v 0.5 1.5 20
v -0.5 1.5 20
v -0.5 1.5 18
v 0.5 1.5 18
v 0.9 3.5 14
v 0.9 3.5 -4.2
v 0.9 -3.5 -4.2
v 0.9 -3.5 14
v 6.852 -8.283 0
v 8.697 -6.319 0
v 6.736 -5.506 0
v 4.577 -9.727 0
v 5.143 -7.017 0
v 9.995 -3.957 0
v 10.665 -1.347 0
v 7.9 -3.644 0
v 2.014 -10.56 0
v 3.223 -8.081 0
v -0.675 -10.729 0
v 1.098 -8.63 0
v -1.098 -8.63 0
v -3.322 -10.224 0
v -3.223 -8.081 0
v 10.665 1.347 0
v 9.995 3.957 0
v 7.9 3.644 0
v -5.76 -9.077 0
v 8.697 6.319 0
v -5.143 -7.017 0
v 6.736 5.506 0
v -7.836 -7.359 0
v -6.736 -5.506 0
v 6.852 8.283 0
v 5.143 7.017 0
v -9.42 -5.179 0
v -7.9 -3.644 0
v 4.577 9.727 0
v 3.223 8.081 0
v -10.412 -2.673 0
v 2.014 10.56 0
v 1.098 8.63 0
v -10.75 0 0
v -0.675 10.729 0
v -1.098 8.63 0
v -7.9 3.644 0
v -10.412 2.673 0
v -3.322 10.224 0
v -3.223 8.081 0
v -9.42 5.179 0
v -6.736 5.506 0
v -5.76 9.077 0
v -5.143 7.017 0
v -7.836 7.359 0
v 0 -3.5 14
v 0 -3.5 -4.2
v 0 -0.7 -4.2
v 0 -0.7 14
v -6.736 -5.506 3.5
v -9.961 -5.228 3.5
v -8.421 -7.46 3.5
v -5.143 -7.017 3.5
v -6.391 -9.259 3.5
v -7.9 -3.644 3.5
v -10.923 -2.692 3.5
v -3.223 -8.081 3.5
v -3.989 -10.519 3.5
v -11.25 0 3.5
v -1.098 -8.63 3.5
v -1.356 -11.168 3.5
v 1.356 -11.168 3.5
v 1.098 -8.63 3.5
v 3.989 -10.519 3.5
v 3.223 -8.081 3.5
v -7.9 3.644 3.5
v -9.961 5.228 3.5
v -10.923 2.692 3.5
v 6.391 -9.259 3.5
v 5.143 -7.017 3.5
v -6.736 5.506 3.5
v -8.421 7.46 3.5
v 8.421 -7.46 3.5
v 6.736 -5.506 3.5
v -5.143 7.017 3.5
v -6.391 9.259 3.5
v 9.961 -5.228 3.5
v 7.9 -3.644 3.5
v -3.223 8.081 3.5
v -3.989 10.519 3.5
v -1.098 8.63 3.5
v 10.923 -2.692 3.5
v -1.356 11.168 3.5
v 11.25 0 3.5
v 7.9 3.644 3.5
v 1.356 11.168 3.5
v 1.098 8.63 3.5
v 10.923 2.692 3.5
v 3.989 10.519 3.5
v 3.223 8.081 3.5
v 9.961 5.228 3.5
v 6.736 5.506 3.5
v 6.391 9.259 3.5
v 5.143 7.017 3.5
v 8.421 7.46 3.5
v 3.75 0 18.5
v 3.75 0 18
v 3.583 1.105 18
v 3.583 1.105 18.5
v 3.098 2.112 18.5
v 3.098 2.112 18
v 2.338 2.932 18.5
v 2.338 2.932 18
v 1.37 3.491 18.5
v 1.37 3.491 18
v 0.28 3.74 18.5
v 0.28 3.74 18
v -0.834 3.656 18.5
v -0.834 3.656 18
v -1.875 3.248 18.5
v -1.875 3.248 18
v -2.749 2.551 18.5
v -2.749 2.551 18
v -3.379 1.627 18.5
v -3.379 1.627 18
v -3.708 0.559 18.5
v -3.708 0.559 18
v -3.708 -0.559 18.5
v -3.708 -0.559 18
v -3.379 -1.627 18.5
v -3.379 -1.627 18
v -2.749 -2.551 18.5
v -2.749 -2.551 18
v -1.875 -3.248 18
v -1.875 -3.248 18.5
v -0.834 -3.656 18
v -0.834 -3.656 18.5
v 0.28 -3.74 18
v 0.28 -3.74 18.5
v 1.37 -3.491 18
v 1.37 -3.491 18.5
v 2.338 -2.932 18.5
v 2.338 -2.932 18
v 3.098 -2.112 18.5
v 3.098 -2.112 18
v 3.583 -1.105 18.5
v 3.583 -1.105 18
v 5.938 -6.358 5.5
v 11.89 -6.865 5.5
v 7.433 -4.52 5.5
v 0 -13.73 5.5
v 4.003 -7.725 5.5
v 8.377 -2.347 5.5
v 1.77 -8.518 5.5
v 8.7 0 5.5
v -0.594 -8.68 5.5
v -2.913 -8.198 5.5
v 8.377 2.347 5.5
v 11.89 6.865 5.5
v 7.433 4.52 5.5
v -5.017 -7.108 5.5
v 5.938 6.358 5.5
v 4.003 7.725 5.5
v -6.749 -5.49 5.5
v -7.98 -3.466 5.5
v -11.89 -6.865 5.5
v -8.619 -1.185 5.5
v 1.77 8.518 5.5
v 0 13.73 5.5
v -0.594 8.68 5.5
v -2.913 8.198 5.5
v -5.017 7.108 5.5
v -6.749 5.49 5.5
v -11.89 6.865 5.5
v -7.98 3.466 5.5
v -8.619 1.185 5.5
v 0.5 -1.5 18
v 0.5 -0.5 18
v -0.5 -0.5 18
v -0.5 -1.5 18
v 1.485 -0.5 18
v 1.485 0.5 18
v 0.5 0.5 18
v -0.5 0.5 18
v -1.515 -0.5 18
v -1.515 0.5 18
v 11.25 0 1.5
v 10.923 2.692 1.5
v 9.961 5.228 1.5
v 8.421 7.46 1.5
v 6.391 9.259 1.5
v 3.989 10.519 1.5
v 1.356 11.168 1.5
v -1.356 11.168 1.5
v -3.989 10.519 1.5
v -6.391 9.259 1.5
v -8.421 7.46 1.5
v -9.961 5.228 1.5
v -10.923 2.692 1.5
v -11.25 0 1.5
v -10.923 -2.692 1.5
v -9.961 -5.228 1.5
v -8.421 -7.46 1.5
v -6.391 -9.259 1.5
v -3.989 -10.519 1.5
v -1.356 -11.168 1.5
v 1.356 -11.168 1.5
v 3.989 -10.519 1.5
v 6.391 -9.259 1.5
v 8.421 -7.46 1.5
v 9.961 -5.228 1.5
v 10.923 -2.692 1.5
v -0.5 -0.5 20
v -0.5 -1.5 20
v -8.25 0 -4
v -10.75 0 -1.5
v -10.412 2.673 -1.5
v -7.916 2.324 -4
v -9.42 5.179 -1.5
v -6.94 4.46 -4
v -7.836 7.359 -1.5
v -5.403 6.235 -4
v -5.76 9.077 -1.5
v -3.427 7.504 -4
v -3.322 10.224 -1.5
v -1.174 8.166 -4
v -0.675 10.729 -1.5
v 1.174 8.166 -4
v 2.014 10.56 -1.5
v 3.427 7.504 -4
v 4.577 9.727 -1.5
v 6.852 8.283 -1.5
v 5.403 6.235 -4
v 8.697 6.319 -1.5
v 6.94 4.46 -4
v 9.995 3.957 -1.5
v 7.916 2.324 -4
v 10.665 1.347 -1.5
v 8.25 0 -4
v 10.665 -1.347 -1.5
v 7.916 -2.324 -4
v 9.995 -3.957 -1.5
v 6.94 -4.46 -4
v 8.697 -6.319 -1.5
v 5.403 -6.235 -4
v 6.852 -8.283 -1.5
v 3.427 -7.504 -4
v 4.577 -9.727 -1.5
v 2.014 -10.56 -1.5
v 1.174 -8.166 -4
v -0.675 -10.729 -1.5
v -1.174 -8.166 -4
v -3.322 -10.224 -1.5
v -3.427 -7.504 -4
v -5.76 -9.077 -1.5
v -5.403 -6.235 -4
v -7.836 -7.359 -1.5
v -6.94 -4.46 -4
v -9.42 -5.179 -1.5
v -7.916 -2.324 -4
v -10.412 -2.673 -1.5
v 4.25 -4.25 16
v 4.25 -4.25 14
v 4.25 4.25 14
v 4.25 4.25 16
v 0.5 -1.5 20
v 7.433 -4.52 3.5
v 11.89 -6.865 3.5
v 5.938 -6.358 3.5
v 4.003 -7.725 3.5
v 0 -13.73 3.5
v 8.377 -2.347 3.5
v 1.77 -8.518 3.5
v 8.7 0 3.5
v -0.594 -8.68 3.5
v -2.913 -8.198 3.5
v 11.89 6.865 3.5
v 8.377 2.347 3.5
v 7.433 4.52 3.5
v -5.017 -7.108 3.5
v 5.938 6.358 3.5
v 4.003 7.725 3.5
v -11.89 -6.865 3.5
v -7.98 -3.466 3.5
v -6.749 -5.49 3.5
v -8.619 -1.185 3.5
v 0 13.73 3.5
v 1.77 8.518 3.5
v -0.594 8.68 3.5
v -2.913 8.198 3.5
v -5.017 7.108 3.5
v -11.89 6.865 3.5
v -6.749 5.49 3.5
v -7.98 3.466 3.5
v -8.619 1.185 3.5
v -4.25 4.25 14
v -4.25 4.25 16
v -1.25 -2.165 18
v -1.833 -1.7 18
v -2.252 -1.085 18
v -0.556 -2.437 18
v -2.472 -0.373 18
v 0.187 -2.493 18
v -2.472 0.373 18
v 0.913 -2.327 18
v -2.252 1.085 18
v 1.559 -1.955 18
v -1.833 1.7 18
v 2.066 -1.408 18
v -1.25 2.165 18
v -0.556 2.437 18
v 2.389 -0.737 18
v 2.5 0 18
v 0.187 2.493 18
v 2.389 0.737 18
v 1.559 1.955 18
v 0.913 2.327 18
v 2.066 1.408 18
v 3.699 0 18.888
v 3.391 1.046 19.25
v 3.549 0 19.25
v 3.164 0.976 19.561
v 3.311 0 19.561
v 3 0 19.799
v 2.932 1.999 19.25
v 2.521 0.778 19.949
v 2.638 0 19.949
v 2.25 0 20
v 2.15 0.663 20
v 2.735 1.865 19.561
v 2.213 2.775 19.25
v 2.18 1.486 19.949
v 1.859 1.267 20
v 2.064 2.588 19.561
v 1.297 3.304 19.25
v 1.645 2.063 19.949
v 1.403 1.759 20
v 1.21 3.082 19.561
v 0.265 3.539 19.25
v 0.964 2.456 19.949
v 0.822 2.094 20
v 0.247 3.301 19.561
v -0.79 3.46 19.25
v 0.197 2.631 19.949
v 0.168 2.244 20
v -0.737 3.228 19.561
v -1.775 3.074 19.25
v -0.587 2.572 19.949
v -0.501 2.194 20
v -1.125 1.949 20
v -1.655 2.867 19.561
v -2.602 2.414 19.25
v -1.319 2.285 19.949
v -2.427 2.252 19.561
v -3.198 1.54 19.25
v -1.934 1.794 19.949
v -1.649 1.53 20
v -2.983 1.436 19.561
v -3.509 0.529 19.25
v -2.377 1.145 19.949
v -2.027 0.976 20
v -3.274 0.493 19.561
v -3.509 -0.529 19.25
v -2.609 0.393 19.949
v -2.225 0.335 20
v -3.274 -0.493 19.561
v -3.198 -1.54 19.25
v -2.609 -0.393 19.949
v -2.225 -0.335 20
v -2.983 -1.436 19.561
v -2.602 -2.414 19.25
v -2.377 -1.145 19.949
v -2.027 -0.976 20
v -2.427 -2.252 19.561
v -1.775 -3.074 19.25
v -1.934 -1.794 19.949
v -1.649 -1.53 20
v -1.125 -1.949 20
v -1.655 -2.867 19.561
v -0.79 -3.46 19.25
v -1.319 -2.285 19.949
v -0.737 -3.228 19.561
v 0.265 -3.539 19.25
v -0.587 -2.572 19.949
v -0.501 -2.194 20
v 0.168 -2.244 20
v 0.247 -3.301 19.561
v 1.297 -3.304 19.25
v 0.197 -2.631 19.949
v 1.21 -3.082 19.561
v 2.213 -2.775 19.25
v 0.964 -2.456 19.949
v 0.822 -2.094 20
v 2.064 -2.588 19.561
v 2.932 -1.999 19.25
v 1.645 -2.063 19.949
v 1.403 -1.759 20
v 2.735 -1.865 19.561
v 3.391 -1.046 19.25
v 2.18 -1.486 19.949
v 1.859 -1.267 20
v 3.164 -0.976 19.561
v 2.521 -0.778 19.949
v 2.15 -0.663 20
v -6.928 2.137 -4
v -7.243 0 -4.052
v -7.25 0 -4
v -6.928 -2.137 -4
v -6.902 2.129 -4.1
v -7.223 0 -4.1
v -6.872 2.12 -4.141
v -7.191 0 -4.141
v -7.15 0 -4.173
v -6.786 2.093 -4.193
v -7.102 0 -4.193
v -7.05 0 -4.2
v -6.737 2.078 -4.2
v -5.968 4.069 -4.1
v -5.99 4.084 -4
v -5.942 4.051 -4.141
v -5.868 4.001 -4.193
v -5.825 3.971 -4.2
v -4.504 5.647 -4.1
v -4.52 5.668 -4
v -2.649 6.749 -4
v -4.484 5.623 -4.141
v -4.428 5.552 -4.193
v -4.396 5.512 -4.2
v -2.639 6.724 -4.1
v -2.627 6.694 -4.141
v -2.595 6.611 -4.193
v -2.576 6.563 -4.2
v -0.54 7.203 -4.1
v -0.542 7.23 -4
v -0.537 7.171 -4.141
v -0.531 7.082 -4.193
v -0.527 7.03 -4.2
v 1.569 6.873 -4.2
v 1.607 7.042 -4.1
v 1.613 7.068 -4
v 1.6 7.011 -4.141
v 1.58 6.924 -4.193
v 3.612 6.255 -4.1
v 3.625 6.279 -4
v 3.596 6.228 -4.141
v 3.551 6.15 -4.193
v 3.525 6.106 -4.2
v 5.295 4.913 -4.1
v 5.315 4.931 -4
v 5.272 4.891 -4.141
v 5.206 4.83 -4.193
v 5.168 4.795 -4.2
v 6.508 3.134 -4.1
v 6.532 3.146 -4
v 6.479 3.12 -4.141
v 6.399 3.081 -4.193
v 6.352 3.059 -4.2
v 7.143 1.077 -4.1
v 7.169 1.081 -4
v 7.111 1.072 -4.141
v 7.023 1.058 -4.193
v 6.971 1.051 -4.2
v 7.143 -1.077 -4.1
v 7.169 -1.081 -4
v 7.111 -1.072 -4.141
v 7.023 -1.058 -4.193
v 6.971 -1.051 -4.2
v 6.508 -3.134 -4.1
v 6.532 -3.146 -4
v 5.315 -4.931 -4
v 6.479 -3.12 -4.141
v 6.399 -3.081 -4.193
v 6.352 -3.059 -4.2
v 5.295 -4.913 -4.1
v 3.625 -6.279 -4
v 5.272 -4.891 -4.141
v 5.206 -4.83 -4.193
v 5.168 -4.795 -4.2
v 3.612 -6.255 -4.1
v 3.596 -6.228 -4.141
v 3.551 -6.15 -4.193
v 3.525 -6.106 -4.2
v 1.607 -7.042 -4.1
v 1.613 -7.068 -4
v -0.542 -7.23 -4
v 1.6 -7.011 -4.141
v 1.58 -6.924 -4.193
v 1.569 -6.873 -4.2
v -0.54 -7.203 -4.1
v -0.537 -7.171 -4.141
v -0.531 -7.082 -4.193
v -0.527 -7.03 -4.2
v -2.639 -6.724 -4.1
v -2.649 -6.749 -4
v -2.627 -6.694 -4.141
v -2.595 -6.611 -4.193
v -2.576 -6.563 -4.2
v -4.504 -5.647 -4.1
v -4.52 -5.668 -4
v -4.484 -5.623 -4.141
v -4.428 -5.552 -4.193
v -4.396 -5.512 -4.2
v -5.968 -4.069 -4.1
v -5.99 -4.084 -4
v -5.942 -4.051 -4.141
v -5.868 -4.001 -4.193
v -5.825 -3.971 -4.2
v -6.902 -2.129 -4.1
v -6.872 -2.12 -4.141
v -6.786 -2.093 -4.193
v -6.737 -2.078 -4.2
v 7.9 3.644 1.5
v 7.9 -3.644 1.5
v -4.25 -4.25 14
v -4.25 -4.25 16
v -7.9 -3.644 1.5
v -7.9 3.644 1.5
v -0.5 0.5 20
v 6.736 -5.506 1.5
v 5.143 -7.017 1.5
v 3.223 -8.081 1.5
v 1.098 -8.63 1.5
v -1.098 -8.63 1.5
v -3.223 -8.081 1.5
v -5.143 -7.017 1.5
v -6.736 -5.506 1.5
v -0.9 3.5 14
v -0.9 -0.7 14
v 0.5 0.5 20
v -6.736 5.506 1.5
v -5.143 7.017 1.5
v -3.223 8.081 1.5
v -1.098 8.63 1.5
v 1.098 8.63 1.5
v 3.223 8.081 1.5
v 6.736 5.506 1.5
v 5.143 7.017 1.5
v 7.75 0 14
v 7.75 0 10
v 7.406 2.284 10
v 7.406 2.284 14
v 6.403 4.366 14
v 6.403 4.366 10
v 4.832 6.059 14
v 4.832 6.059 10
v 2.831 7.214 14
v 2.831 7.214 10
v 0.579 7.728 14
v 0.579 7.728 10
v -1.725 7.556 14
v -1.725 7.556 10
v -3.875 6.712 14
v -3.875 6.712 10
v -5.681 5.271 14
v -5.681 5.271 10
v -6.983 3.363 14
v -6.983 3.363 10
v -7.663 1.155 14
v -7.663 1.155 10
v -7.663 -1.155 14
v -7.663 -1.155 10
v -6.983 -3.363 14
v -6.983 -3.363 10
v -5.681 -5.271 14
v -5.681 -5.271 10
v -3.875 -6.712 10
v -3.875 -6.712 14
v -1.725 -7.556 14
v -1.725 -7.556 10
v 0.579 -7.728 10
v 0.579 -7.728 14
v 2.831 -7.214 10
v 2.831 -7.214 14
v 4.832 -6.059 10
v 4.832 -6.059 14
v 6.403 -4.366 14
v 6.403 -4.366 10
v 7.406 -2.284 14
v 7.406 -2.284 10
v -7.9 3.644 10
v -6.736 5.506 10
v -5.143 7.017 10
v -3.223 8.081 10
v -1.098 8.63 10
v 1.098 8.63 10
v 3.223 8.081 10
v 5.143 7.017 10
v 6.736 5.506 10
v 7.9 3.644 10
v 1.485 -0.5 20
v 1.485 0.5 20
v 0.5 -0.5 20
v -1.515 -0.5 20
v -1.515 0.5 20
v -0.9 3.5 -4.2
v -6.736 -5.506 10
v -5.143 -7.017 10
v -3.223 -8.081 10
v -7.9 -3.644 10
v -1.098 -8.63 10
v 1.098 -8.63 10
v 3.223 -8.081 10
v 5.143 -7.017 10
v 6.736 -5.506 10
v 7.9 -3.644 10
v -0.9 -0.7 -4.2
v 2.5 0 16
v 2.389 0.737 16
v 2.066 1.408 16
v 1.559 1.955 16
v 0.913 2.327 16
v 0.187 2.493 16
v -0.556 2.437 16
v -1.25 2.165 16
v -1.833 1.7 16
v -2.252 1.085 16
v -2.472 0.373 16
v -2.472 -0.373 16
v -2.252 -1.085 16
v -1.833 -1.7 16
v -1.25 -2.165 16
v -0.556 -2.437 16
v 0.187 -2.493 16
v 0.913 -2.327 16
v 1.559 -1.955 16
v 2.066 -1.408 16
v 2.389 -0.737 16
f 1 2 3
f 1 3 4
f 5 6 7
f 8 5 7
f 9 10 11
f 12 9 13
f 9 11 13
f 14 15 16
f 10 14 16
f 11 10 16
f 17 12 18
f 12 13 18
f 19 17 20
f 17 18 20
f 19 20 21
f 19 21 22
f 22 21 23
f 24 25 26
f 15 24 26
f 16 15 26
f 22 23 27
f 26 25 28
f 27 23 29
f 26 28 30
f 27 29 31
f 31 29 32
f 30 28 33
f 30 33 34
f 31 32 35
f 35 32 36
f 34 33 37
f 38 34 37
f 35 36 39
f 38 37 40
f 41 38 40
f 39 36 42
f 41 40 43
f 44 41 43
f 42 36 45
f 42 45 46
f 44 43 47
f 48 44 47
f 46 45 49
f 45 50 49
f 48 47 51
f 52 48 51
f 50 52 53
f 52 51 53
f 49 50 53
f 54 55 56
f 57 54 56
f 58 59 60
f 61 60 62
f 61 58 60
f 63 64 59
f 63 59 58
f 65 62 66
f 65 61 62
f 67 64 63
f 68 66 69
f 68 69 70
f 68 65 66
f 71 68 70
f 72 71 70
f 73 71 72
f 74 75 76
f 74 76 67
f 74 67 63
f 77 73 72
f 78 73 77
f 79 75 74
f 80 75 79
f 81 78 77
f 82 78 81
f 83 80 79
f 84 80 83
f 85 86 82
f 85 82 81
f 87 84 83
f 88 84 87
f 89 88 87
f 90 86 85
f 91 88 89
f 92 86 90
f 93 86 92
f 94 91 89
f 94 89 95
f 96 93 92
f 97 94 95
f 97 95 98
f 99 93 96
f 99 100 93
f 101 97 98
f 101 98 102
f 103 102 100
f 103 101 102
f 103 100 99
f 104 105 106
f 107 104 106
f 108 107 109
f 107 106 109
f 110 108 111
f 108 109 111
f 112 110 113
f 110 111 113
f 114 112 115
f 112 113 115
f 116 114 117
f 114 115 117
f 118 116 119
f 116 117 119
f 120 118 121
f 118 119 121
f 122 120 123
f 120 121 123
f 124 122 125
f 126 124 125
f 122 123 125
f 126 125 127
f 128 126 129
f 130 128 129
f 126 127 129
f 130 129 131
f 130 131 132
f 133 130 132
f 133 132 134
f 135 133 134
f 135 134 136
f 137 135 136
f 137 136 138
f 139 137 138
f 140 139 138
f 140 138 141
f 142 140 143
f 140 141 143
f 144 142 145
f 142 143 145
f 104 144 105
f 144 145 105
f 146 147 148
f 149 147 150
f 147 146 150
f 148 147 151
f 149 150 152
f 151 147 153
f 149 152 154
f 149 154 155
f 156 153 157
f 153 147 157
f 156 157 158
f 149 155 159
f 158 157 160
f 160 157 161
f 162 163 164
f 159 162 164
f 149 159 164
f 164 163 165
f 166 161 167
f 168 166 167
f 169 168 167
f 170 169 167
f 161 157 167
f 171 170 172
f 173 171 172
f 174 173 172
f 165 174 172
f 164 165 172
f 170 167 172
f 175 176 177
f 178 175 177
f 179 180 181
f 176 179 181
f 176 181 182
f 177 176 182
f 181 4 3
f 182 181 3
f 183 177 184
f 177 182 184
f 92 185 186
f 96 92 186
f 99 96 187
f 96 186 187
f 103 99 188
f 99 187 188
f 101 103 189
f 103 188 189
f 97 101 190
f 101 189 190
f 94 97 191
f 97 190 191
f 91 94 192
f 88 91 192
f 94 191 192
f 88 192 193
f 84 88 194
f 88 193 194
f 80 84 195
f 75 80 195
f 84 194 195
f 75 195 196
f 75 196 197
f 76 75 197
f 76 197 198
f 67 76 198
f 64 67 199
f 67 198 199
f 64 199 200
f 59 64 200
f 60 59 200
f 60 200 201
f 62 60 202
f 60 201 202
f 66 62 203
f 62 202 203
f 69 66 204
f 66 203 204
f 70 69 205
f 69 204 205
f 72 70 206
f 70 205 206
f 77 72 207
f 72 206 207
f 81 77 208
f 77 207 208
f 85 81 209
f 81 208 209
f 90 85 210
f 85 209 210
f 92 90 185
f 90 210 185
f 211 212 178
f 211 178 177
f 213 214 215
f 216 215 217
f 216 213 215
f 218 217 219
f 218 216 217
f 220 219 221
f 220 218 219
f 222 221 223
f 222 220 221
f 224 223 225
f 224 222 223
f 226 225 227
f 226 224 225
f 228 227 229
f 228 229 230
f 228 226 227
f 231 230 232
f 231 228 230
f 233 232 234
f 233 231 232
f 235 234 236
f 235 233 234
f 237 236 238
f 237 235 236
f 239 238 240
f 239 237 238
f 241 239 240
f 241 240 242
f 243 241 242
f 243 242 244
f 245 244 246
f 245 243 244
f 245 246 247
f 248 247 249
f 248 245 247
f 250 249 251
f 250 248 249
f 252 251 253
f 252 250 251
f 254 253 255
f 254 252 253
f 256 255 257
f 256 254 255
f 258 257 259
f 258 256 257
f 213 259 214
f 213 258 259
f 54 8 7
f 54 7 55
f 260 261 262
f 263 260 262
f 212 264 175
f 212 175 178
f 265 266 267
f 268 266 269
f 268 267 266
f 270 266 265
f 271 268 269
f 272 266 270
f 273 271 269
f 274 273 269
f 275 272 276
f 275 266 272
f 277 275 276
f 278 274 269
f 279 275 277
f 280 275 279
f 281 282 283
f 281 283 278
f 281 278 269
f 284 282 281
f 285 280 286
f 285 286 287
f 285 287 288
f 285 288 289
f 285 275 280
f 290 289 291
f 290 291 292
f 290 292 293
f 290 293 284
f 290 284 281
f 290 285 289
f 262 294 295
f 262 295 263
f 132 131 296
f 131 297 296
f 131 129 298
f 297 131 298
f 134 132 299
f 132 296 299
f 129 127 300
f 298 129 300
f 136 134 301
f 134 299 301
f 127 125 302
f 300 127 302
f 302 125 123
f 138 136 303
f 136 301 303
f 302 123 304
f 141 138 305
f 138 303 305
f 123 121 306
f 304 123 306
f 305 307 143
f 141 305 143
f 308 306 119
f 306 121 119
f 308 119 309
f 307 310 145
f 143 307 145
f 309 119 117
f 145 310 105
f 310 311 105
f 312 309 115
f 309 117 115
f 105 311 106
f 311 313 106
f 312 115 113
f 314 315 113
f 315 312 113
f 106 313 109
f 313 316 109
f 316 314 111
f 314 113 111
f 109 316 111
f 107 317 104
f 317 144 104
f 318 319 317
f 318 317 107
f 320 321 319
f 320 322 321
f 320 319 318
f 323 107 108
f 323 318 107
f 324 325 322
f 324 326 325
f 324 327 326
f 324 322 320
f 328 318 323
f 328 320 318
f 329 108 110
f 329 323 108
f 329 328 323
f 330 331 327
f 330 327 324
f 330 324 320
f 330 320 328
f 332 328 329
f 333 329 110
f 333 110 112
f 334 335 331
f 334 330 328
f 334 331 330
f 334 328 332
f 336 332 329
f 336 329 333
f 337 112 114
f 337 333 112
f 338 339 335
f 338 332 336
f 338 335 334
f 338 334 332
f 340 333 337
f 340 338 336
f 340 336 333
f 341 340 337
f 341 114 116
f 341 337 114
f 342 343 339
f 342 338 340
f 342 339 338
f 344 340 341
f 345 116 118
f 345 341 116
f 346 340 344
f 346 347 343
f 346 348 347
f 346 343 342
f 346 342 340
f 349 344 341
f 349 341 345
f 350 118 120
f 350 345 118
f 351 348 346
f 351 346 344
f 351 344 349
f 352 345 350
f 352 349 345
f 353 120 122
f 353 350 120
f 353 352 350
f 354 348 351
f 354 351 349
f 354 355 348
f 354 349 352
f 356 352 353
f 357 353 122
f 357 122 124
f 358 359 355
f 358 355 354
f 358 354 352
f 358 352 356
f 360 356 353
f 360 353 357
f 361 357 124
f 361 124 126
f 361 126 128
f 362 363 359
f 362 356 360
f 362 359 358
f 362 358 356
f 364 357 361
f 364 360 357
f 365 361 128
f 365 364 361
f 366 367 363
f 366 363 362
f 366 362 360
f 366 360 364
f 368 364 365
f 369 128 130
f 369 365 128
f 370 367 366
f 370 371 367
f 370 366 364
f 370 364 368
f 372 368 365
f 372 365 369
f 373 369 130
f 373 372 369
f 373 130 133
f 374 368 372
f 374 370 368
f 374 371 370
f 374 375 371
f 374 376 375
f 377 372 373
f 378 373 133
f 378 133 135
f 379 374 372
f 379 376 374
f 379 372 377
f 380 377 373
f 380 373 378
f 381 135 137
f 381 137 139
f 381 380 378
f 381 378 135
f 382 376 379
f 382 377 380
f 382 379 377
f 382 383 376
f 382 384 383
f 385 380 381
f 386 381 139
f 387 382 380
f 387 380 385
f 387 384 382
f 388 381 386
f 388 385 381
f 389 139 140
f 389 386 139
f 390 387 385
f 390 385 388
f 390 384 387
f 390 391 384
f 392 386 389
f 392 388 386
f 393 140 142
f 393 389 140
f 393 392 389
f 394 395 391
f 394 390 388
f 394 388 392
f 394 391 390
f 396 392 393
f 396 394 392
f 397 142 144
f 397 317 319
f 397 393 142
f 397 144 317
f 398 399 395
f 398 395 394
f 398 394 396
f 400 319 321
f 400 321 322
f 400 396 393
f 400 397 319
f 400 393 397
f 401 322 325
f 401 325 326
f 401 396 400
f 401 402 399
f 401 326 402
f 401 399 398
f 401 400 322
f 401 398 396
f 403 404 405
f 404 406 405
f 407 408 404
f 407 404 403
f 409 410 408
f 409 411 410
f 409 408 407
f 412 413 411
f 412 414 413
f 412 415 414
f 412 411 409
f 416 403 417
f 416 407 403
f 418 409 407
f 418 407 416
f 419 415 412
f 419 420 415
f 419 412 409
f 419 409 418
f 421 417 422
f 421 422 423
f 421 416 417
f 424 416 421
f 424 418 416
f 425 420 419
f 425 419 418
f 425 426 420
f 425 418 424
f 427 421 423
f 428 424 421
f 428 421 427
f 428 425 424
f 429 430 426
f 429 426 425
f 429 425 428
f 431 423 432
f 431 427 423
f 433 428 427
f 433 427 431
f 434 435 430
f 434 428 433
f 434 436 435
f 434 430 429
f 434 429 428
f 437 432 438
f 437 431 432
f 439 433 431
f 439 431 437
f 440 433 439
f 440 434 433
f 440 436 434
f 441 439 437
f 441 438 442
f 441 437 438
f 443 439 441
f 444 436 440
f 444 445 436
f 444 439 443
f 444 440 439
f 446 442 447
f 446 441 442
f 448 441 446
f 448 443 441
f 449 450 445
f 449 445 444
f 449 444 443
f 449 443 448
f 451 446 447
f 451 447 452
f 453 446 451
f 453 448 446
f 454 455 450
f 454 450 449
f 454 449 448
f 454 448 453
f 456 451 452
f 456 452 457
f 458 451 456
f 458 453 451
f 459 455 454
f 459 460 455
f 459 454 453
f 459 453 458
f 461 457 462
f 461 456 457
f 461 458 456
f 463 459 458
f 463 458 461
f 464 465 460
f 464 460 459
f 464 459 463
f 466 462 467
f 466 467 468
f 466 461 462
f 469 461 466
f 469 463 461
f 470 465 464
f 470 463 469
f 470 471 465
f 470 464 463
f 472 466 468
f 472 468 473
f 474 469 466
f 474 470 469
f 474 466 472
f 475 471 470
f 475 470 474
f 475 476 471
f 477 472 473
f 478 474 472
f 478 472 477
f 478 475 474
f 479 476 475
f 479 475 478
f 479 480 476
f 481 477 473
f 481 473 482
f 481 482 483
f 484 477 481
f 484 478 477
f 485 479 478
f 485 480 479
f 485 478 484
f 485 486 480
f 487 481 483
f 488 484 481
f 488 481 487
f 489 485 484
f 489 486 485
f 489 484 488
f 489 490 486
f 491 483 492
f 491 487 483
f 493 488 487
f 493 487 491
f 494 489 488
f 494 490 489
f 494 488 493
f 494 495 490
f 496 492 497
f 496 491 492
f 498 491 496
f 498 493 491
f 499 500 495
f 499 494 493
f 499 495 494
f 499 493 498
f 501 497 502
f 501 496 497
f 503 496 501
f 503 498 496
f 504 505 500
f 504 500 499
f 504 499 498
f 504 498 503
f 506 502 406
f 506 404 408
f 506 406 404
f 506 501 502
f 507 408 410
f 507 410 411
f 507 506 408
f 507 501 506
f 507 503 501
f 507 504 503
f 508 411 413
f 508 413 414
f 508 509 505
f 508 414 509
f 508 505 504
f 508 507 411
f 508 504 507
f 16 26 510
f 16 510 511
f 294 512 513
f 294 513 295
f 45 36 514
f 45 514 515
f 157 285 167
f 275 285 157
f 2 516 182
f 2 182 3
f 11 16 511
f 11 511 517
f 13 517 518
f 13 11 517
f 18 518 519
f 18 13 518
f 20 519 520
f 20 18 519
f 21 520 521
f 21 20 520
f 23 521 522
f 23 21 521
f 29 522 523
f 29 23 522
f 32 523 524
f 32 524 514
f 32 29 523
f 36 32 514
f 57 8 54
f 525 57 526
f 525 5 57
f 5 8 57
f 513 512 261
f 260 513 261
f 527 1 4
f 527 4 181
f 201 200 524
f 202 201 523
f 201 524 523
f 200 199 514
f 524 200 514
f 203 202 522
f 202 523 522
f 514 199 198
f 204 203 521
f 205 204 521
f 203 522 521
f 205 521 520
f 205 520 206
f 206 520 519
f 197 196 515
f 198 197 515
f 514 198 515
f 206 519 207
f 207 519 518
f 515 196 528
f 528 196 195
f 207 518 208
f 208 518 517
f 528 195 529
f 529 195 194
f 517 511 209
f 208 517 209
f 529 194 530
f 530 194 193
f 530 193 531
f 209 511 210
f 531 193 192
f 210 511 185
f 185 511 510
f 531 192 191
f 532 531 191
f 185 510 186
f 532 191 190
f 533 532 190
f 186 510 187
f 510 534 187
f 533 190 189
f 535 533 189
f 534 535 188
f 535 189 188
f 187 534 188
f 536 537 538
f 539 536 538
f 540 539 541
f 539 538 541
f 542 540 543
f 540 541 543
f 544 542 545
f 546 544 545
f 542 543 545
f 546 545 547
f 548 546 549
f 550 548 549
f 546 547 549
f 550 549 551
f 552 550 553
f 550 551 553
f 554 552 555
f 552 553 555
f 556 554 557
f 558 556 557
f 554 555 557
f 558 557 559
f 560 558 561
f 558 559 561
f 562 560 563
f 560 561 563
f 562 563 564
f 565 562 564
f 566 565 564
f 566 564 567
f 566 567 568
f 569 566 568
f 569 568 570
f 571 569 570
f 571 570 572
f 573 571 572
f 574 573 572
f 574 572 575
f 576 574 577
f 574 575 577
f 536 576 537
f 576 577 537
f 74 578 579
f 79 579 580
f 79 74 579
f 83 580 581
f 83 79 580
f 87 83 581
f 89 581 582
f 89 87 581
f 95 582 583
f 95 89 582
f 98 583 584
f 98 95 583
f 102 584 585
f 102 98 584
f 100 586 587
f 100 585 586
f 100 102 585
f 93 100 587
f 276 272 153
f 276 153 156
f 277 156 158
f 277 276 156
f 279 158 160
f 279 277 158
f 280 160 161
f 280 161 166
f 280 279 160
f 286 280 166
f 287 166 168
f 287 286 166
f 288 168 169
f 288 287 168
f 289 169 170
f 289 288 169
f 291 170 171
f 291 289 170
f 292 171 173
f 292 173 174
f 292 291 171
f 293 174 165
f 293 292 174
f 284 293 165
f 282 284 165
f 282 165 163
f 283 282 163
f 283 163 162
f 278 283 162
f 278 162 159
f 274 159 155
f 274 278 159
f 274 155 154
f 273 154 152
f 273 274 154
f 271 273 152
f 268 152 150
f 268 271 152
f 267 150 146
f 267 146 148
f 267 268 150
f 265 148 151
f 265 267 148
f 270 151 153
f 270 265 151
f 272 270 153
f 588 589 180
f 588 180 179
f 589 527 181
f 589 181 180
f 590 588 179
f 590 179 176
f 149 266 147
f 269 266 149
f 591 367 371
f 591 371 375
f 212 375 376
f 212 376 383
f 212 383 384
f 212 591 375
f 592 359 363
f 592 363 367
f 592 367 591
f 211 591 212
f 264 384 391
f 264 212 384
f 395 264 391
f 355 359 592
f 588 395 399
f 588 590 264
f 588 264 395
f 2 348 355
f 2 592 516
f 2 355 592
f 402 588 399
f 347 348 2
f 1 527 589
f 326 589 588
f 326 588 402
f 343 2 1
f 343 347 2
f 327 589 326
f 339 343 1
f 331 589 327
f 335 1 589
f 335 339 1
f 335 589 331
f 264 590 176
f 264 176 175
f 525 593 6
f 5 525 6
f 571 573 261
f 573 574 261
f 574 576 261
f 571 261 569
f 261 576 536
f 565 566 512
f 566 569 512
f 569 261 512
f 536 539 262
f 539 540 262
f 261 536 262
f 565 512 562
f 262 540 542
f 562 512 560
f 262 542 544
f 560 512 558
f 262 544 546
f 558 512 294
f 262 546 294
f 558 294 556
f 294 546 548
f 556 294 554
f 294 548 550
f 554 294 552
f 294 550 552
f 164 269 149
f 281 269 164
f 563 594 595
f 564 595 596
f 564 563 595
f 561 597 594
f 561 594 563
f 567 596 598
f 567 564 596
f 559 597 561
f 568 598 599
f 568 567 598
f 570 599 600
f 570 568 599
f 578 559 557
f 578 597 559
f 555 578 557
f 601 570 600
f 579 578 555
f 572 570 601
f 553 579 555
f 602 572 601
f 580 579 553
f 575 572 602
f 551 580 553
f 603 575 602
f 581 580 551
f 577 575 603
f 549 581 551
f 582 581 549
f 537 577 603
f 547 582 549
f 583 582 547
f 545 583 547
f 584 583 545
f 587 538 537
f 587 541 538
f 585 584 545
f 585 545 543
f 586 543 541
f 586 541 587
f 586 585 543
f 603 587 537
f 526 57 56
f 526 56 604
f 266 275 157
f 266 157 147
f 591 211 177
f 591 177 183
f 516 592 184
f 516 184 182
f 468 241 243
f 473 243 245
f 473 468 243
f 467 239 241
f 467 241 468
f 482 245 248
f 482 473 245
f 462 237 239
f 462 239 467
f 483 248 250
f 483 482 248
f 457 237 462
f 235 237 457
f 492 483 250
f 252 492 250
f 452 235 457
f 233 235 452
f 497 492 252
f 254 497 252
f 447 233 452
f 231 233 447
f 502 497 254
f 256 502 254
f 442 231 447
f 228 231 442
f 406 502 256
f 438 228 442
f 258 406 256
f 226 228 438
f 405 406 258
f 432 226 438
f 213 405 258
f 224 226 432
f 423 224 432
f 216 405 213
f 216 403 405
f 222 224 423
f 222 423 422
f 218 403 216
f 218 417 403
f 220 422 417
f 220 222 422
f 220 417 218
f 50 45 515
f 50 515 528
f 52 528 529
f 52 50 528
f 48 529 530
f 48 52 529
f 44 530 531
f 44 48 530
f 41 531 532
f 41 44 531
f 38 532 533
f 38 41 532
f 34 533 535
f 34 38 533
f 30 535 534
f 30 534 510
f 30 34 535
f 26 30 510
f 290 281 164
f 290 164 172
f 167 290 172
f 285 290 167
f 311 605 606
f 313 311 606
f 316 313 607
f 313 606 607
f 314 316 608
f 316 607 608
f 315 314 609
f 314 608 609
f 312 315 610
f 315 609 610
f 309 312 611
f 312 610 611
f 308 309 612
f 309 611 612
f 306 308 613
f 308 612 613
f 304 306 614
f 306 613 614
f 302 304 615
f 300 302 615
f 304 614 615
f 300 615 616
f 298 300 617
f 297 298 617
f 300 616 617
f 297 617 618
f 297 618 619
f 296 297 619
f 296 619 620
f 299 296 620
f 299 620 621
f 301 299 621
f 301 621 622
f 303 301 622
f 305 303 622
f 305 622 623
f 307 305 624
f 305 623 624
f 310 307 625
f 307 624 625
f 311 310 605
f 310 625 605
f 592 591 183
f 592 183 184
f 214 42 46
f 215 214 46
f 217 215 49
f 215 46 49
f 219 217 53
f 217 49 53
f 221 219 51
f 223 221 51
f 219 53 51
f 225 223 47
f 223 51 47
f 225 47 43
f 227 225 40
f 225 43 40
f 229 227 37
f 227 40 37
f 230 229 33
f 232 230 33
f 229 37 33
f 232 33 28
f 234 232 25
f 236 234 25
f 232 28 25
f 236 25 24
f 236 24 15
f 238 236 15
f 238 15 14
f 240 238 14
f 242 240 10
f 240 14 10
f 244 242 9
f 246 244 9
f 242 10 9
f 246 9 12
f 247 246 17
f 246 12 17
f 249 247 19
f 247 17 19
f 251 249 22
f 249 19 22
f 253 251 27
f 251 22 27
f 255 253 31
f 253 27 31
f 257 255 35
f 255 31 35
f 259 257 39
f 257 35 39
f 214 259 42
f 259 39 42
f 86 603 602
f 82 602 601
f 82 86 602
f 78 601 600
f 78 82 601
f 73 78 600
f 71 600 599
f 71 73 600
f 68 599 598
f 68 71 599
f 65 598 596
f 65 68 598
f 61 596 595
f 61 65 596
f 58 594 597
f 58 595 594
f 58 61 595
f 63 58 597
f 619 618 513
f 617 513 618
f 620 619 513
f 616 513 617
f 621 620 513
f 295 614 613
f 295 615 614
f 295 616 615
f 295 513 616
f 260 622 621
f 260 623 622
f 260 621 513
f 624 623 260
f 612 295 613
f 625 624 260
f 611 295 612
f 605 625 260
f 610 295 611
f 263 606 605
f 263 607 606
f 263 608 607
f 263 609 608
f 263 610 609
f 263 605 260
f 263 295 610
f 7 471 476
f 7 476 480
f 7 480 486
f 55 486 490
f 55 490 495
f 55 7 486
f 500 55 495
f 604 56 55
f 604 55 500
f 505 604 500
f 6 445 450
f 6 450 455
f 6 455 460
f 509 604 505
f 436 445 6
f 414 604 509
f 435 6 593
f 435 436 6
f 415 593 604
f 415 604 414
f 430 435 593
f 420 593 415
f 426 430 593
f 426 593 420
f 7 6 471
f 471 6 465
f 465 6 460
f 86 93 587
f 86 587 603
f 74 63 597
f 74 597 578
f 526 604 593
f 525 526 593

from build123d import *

# Parameters (mm, degrees)
EXTRUDE_1_DEPTH     = 14
SKETCH_3_R          = 10.75
EXTRUDE_2_DEPTH     = 4
CHAMFER_1_SIZE      = 2.5
SKETCH_4_R          = 11.25
EXTRUDE_3_DEPTH     = 2
SKETCH_5_W          = 8.5
SKETCH_5_H          = 8.5
EXTRUDE_4_DEPTH     = 2
SKETCH_6_R          = 2.5
EXTRUDE_5_DEPTH     = 2
SKETCH_7_R          = 3.75
EXTRUDE_6_DEPTH     = 2
FILLET_1_R          = 1.5
CUT_EXTRUDE_1_DEPTH = 2
SKETCH_9_R          = 8.7
EXTRUDE_7_DEPTH     = 2
SKETCH_12_R         = 7.25
EXTRUDE_8_DEPTH     = 0.2
FILLET_2_R          = 0.2
CUT_EXTRUDE_2_DEPTH = 18.2
CUT_EXTRUDE_START   = -4
SKETCH_13_R         = 7.75
CUT_EXTRUDE_3_DEPTH = 4


with BuildPart() as part:
    # 草图1 → 拉伸1 (new body)
    with BuildSketch(Plane.XY):
        with BuildLine():
            Line((7.9, 3.644173432), (7.9, -3.644173432))
            ThreePointArc((7.9, -3.644173432), (0, -8.7), (-7.9, -3.644173432))
            Line((-7.9, -3.644173432), (-7.9, 3.644173432))
            ThreePointArc((-7.9, 3.644173432), (0, 8.7), (7.9, 3.644173432))
        make_face()
    extrude(amount=EXTRUDE_1_DEPTH)

    # 草图3 → 拉伸2 (add)
    with BuildSketch(Plane(origin=(0, 0, 0), x_dir=(-1, 0, 0), z_dir=(0, 0, -1))):
        Circle(SKETCH_3_R)
    extrude(amount=EXTRUDE_2_DEPTH)

    # 倒角1
    chamfer_1_edges = [part.edges().sort_by_distance(p)[0] for p in [
        (10.75, 0, -4),
    ]]
    chamfer(chamfer_1_edges, length=CHAMFER_1_SIZE)

    # 草图4 → 拉伸3 (add)
    with BuildSketch(Plane.XY.offset(1.5)):
        Circle(SKETCH_4_R)
        with BuildLine():
            Line((-7.11658576, 3.762539983), (-7.11658576, -3.762539983))
            ThreePointArc((-7.11658576, -3.762539983), (0, -8.05), (7.11658576, -3.762539983))
            Line((7.11658576, -3.762539983), (7.11658576, 3.762539983))
            ThreePointArc((7.11658576, 3.762539983), (0, 8.05), (-7.11658576, 3.762539983))
        make_face(mode=Mode.SUBTRACT)
    extrude(amount=EXTRUDE_3_DEPTH)

    # 草图5 → 拉伸4 (add)
    with BuildSketch(Plane.XY.offset(14)):
        Rectangle(SKETCH_5_W, SKETCH_5_H)
    extrude(amount=EXTRUDE_4_DEPTH)

    # 草图6 → 拉伸5 (add)
    with BuildSketch(Plane.XY.offset(16)):
        Circle(SKETCH_6_R)
    extrude(amount=EXTRUDE_5_DEPTH)

    # 草图7 → 拉伸6 (add)
    with BuildSketch(Plane.XY.offset(18)):
        Circle(SKETCH_7_R)
    extrude(amount=EXTRUDE_6_DEPTH)

    # 圆角1
    fillet_1_edges = [part.edges().sort_by_distance(p)[0] for p in [
        (-3.75, 0, 20),
    ]]
    fillet(fillet_1_edges, radius=FILLET_1_R)

    # 草图8 → 切除-拉伸1 (cut)
    with BuildSketch(Plane.XY.offset(20)):
        Polygon((-1.514696486, 0.5), (-0.5, 0.5), (-0.5, 1.5), (0.5, 1.5), (0.5, 0.5), (1.485303514, 0.5), (1.485303514, -0.5), (0.5, -0.5), (0.5, -1.5), (-0.5, -1.5), (-0.5, -0.5), (-1.514696486, -0.5), align=None)
    extrude(amount=-CUT_EXTRUDE_1_DEPTH, mode=Mode.SUBTRACT)

    # 草图12 → 拉伸8 (add)
    with BuildSketch(Plane(origin=(0, 0, -4), x_dir=(-1, 0, 0), z_dir=(0, 0, -1))):
        Circle(SKETCH_12_R)
    extrude(amount=EXTRUDE_8_DEPTH)

    # 圆角2
    fillet_2_edges = [part.edges().sort_by_distance(p)[0] for p in [
        (7.25, 0, -4.2),
    ]]
    fillet(fillet_2_edges, radius=FILLET_2_R - 0.0001)  # a hair under: the kernel refuses the full size

    # 草图10 → 切除-拉伸2 (cut)
    with BuildSketch(Plane(origin=(0, 0, -4.2), x_dir=(-1, 0, 0), z_dir=(0, 0, -1))):
        Polygon((-0.9, 3.5), (-0.9, -3.5), (0, -3.5), (0, -0.7), (0.9, -0.7), (0.9, 3.5), align=None)
    extrude(amount=-CUT_EXTRUDE_2_DEPTH, mode=Mode.SUBTRACT)

    # 草图13 → 切除-拉伸3 (cut)
    with BuildSketch(Plane.XY.offset(14).offset(CUT_EXTRUDE_START)):
        with BuildLine():
            Line((7.9, -3.644173432), (7.9, 3.644173432))
            ThreePointArc((7.9, 3.644173432), (0, 8.7), (-7.9, 3.644173432))
            Line((-7.9, 3.644173432), (-7.9, -3.644173432))
            ThreePointArc((-7.9, -3.644173432), (0, -8.7), (7.9, -3.644173432))
        make_face()
        Circle(SKETCH_13_R, mode=Mode.SUBTRACT)
    extrude(amount=CUT_EXTRUDE_3_DEPTH, mode=Mode.SUBTRACT)


with BuildPart() as body_2:
    # 草图9 → 拉伸7 (new body)
    with BuildSketch(Plane.XY.offset(3.5)):
        Polygon((11.890098709, -6.86475169), (0, -13.72950338), (-11.890098709, -6.86475169), (-11.890098709, 6.86475169), (0, 13.72950338), (11.890098709, 6.86475169), align=None)
        Circle(SKETCH_9_R, mode=Mode.SUBTRACT)
    extrude(amount=EXTRUDE_7_DEPTH)


solid = Compound([part.part, body_2.part])
